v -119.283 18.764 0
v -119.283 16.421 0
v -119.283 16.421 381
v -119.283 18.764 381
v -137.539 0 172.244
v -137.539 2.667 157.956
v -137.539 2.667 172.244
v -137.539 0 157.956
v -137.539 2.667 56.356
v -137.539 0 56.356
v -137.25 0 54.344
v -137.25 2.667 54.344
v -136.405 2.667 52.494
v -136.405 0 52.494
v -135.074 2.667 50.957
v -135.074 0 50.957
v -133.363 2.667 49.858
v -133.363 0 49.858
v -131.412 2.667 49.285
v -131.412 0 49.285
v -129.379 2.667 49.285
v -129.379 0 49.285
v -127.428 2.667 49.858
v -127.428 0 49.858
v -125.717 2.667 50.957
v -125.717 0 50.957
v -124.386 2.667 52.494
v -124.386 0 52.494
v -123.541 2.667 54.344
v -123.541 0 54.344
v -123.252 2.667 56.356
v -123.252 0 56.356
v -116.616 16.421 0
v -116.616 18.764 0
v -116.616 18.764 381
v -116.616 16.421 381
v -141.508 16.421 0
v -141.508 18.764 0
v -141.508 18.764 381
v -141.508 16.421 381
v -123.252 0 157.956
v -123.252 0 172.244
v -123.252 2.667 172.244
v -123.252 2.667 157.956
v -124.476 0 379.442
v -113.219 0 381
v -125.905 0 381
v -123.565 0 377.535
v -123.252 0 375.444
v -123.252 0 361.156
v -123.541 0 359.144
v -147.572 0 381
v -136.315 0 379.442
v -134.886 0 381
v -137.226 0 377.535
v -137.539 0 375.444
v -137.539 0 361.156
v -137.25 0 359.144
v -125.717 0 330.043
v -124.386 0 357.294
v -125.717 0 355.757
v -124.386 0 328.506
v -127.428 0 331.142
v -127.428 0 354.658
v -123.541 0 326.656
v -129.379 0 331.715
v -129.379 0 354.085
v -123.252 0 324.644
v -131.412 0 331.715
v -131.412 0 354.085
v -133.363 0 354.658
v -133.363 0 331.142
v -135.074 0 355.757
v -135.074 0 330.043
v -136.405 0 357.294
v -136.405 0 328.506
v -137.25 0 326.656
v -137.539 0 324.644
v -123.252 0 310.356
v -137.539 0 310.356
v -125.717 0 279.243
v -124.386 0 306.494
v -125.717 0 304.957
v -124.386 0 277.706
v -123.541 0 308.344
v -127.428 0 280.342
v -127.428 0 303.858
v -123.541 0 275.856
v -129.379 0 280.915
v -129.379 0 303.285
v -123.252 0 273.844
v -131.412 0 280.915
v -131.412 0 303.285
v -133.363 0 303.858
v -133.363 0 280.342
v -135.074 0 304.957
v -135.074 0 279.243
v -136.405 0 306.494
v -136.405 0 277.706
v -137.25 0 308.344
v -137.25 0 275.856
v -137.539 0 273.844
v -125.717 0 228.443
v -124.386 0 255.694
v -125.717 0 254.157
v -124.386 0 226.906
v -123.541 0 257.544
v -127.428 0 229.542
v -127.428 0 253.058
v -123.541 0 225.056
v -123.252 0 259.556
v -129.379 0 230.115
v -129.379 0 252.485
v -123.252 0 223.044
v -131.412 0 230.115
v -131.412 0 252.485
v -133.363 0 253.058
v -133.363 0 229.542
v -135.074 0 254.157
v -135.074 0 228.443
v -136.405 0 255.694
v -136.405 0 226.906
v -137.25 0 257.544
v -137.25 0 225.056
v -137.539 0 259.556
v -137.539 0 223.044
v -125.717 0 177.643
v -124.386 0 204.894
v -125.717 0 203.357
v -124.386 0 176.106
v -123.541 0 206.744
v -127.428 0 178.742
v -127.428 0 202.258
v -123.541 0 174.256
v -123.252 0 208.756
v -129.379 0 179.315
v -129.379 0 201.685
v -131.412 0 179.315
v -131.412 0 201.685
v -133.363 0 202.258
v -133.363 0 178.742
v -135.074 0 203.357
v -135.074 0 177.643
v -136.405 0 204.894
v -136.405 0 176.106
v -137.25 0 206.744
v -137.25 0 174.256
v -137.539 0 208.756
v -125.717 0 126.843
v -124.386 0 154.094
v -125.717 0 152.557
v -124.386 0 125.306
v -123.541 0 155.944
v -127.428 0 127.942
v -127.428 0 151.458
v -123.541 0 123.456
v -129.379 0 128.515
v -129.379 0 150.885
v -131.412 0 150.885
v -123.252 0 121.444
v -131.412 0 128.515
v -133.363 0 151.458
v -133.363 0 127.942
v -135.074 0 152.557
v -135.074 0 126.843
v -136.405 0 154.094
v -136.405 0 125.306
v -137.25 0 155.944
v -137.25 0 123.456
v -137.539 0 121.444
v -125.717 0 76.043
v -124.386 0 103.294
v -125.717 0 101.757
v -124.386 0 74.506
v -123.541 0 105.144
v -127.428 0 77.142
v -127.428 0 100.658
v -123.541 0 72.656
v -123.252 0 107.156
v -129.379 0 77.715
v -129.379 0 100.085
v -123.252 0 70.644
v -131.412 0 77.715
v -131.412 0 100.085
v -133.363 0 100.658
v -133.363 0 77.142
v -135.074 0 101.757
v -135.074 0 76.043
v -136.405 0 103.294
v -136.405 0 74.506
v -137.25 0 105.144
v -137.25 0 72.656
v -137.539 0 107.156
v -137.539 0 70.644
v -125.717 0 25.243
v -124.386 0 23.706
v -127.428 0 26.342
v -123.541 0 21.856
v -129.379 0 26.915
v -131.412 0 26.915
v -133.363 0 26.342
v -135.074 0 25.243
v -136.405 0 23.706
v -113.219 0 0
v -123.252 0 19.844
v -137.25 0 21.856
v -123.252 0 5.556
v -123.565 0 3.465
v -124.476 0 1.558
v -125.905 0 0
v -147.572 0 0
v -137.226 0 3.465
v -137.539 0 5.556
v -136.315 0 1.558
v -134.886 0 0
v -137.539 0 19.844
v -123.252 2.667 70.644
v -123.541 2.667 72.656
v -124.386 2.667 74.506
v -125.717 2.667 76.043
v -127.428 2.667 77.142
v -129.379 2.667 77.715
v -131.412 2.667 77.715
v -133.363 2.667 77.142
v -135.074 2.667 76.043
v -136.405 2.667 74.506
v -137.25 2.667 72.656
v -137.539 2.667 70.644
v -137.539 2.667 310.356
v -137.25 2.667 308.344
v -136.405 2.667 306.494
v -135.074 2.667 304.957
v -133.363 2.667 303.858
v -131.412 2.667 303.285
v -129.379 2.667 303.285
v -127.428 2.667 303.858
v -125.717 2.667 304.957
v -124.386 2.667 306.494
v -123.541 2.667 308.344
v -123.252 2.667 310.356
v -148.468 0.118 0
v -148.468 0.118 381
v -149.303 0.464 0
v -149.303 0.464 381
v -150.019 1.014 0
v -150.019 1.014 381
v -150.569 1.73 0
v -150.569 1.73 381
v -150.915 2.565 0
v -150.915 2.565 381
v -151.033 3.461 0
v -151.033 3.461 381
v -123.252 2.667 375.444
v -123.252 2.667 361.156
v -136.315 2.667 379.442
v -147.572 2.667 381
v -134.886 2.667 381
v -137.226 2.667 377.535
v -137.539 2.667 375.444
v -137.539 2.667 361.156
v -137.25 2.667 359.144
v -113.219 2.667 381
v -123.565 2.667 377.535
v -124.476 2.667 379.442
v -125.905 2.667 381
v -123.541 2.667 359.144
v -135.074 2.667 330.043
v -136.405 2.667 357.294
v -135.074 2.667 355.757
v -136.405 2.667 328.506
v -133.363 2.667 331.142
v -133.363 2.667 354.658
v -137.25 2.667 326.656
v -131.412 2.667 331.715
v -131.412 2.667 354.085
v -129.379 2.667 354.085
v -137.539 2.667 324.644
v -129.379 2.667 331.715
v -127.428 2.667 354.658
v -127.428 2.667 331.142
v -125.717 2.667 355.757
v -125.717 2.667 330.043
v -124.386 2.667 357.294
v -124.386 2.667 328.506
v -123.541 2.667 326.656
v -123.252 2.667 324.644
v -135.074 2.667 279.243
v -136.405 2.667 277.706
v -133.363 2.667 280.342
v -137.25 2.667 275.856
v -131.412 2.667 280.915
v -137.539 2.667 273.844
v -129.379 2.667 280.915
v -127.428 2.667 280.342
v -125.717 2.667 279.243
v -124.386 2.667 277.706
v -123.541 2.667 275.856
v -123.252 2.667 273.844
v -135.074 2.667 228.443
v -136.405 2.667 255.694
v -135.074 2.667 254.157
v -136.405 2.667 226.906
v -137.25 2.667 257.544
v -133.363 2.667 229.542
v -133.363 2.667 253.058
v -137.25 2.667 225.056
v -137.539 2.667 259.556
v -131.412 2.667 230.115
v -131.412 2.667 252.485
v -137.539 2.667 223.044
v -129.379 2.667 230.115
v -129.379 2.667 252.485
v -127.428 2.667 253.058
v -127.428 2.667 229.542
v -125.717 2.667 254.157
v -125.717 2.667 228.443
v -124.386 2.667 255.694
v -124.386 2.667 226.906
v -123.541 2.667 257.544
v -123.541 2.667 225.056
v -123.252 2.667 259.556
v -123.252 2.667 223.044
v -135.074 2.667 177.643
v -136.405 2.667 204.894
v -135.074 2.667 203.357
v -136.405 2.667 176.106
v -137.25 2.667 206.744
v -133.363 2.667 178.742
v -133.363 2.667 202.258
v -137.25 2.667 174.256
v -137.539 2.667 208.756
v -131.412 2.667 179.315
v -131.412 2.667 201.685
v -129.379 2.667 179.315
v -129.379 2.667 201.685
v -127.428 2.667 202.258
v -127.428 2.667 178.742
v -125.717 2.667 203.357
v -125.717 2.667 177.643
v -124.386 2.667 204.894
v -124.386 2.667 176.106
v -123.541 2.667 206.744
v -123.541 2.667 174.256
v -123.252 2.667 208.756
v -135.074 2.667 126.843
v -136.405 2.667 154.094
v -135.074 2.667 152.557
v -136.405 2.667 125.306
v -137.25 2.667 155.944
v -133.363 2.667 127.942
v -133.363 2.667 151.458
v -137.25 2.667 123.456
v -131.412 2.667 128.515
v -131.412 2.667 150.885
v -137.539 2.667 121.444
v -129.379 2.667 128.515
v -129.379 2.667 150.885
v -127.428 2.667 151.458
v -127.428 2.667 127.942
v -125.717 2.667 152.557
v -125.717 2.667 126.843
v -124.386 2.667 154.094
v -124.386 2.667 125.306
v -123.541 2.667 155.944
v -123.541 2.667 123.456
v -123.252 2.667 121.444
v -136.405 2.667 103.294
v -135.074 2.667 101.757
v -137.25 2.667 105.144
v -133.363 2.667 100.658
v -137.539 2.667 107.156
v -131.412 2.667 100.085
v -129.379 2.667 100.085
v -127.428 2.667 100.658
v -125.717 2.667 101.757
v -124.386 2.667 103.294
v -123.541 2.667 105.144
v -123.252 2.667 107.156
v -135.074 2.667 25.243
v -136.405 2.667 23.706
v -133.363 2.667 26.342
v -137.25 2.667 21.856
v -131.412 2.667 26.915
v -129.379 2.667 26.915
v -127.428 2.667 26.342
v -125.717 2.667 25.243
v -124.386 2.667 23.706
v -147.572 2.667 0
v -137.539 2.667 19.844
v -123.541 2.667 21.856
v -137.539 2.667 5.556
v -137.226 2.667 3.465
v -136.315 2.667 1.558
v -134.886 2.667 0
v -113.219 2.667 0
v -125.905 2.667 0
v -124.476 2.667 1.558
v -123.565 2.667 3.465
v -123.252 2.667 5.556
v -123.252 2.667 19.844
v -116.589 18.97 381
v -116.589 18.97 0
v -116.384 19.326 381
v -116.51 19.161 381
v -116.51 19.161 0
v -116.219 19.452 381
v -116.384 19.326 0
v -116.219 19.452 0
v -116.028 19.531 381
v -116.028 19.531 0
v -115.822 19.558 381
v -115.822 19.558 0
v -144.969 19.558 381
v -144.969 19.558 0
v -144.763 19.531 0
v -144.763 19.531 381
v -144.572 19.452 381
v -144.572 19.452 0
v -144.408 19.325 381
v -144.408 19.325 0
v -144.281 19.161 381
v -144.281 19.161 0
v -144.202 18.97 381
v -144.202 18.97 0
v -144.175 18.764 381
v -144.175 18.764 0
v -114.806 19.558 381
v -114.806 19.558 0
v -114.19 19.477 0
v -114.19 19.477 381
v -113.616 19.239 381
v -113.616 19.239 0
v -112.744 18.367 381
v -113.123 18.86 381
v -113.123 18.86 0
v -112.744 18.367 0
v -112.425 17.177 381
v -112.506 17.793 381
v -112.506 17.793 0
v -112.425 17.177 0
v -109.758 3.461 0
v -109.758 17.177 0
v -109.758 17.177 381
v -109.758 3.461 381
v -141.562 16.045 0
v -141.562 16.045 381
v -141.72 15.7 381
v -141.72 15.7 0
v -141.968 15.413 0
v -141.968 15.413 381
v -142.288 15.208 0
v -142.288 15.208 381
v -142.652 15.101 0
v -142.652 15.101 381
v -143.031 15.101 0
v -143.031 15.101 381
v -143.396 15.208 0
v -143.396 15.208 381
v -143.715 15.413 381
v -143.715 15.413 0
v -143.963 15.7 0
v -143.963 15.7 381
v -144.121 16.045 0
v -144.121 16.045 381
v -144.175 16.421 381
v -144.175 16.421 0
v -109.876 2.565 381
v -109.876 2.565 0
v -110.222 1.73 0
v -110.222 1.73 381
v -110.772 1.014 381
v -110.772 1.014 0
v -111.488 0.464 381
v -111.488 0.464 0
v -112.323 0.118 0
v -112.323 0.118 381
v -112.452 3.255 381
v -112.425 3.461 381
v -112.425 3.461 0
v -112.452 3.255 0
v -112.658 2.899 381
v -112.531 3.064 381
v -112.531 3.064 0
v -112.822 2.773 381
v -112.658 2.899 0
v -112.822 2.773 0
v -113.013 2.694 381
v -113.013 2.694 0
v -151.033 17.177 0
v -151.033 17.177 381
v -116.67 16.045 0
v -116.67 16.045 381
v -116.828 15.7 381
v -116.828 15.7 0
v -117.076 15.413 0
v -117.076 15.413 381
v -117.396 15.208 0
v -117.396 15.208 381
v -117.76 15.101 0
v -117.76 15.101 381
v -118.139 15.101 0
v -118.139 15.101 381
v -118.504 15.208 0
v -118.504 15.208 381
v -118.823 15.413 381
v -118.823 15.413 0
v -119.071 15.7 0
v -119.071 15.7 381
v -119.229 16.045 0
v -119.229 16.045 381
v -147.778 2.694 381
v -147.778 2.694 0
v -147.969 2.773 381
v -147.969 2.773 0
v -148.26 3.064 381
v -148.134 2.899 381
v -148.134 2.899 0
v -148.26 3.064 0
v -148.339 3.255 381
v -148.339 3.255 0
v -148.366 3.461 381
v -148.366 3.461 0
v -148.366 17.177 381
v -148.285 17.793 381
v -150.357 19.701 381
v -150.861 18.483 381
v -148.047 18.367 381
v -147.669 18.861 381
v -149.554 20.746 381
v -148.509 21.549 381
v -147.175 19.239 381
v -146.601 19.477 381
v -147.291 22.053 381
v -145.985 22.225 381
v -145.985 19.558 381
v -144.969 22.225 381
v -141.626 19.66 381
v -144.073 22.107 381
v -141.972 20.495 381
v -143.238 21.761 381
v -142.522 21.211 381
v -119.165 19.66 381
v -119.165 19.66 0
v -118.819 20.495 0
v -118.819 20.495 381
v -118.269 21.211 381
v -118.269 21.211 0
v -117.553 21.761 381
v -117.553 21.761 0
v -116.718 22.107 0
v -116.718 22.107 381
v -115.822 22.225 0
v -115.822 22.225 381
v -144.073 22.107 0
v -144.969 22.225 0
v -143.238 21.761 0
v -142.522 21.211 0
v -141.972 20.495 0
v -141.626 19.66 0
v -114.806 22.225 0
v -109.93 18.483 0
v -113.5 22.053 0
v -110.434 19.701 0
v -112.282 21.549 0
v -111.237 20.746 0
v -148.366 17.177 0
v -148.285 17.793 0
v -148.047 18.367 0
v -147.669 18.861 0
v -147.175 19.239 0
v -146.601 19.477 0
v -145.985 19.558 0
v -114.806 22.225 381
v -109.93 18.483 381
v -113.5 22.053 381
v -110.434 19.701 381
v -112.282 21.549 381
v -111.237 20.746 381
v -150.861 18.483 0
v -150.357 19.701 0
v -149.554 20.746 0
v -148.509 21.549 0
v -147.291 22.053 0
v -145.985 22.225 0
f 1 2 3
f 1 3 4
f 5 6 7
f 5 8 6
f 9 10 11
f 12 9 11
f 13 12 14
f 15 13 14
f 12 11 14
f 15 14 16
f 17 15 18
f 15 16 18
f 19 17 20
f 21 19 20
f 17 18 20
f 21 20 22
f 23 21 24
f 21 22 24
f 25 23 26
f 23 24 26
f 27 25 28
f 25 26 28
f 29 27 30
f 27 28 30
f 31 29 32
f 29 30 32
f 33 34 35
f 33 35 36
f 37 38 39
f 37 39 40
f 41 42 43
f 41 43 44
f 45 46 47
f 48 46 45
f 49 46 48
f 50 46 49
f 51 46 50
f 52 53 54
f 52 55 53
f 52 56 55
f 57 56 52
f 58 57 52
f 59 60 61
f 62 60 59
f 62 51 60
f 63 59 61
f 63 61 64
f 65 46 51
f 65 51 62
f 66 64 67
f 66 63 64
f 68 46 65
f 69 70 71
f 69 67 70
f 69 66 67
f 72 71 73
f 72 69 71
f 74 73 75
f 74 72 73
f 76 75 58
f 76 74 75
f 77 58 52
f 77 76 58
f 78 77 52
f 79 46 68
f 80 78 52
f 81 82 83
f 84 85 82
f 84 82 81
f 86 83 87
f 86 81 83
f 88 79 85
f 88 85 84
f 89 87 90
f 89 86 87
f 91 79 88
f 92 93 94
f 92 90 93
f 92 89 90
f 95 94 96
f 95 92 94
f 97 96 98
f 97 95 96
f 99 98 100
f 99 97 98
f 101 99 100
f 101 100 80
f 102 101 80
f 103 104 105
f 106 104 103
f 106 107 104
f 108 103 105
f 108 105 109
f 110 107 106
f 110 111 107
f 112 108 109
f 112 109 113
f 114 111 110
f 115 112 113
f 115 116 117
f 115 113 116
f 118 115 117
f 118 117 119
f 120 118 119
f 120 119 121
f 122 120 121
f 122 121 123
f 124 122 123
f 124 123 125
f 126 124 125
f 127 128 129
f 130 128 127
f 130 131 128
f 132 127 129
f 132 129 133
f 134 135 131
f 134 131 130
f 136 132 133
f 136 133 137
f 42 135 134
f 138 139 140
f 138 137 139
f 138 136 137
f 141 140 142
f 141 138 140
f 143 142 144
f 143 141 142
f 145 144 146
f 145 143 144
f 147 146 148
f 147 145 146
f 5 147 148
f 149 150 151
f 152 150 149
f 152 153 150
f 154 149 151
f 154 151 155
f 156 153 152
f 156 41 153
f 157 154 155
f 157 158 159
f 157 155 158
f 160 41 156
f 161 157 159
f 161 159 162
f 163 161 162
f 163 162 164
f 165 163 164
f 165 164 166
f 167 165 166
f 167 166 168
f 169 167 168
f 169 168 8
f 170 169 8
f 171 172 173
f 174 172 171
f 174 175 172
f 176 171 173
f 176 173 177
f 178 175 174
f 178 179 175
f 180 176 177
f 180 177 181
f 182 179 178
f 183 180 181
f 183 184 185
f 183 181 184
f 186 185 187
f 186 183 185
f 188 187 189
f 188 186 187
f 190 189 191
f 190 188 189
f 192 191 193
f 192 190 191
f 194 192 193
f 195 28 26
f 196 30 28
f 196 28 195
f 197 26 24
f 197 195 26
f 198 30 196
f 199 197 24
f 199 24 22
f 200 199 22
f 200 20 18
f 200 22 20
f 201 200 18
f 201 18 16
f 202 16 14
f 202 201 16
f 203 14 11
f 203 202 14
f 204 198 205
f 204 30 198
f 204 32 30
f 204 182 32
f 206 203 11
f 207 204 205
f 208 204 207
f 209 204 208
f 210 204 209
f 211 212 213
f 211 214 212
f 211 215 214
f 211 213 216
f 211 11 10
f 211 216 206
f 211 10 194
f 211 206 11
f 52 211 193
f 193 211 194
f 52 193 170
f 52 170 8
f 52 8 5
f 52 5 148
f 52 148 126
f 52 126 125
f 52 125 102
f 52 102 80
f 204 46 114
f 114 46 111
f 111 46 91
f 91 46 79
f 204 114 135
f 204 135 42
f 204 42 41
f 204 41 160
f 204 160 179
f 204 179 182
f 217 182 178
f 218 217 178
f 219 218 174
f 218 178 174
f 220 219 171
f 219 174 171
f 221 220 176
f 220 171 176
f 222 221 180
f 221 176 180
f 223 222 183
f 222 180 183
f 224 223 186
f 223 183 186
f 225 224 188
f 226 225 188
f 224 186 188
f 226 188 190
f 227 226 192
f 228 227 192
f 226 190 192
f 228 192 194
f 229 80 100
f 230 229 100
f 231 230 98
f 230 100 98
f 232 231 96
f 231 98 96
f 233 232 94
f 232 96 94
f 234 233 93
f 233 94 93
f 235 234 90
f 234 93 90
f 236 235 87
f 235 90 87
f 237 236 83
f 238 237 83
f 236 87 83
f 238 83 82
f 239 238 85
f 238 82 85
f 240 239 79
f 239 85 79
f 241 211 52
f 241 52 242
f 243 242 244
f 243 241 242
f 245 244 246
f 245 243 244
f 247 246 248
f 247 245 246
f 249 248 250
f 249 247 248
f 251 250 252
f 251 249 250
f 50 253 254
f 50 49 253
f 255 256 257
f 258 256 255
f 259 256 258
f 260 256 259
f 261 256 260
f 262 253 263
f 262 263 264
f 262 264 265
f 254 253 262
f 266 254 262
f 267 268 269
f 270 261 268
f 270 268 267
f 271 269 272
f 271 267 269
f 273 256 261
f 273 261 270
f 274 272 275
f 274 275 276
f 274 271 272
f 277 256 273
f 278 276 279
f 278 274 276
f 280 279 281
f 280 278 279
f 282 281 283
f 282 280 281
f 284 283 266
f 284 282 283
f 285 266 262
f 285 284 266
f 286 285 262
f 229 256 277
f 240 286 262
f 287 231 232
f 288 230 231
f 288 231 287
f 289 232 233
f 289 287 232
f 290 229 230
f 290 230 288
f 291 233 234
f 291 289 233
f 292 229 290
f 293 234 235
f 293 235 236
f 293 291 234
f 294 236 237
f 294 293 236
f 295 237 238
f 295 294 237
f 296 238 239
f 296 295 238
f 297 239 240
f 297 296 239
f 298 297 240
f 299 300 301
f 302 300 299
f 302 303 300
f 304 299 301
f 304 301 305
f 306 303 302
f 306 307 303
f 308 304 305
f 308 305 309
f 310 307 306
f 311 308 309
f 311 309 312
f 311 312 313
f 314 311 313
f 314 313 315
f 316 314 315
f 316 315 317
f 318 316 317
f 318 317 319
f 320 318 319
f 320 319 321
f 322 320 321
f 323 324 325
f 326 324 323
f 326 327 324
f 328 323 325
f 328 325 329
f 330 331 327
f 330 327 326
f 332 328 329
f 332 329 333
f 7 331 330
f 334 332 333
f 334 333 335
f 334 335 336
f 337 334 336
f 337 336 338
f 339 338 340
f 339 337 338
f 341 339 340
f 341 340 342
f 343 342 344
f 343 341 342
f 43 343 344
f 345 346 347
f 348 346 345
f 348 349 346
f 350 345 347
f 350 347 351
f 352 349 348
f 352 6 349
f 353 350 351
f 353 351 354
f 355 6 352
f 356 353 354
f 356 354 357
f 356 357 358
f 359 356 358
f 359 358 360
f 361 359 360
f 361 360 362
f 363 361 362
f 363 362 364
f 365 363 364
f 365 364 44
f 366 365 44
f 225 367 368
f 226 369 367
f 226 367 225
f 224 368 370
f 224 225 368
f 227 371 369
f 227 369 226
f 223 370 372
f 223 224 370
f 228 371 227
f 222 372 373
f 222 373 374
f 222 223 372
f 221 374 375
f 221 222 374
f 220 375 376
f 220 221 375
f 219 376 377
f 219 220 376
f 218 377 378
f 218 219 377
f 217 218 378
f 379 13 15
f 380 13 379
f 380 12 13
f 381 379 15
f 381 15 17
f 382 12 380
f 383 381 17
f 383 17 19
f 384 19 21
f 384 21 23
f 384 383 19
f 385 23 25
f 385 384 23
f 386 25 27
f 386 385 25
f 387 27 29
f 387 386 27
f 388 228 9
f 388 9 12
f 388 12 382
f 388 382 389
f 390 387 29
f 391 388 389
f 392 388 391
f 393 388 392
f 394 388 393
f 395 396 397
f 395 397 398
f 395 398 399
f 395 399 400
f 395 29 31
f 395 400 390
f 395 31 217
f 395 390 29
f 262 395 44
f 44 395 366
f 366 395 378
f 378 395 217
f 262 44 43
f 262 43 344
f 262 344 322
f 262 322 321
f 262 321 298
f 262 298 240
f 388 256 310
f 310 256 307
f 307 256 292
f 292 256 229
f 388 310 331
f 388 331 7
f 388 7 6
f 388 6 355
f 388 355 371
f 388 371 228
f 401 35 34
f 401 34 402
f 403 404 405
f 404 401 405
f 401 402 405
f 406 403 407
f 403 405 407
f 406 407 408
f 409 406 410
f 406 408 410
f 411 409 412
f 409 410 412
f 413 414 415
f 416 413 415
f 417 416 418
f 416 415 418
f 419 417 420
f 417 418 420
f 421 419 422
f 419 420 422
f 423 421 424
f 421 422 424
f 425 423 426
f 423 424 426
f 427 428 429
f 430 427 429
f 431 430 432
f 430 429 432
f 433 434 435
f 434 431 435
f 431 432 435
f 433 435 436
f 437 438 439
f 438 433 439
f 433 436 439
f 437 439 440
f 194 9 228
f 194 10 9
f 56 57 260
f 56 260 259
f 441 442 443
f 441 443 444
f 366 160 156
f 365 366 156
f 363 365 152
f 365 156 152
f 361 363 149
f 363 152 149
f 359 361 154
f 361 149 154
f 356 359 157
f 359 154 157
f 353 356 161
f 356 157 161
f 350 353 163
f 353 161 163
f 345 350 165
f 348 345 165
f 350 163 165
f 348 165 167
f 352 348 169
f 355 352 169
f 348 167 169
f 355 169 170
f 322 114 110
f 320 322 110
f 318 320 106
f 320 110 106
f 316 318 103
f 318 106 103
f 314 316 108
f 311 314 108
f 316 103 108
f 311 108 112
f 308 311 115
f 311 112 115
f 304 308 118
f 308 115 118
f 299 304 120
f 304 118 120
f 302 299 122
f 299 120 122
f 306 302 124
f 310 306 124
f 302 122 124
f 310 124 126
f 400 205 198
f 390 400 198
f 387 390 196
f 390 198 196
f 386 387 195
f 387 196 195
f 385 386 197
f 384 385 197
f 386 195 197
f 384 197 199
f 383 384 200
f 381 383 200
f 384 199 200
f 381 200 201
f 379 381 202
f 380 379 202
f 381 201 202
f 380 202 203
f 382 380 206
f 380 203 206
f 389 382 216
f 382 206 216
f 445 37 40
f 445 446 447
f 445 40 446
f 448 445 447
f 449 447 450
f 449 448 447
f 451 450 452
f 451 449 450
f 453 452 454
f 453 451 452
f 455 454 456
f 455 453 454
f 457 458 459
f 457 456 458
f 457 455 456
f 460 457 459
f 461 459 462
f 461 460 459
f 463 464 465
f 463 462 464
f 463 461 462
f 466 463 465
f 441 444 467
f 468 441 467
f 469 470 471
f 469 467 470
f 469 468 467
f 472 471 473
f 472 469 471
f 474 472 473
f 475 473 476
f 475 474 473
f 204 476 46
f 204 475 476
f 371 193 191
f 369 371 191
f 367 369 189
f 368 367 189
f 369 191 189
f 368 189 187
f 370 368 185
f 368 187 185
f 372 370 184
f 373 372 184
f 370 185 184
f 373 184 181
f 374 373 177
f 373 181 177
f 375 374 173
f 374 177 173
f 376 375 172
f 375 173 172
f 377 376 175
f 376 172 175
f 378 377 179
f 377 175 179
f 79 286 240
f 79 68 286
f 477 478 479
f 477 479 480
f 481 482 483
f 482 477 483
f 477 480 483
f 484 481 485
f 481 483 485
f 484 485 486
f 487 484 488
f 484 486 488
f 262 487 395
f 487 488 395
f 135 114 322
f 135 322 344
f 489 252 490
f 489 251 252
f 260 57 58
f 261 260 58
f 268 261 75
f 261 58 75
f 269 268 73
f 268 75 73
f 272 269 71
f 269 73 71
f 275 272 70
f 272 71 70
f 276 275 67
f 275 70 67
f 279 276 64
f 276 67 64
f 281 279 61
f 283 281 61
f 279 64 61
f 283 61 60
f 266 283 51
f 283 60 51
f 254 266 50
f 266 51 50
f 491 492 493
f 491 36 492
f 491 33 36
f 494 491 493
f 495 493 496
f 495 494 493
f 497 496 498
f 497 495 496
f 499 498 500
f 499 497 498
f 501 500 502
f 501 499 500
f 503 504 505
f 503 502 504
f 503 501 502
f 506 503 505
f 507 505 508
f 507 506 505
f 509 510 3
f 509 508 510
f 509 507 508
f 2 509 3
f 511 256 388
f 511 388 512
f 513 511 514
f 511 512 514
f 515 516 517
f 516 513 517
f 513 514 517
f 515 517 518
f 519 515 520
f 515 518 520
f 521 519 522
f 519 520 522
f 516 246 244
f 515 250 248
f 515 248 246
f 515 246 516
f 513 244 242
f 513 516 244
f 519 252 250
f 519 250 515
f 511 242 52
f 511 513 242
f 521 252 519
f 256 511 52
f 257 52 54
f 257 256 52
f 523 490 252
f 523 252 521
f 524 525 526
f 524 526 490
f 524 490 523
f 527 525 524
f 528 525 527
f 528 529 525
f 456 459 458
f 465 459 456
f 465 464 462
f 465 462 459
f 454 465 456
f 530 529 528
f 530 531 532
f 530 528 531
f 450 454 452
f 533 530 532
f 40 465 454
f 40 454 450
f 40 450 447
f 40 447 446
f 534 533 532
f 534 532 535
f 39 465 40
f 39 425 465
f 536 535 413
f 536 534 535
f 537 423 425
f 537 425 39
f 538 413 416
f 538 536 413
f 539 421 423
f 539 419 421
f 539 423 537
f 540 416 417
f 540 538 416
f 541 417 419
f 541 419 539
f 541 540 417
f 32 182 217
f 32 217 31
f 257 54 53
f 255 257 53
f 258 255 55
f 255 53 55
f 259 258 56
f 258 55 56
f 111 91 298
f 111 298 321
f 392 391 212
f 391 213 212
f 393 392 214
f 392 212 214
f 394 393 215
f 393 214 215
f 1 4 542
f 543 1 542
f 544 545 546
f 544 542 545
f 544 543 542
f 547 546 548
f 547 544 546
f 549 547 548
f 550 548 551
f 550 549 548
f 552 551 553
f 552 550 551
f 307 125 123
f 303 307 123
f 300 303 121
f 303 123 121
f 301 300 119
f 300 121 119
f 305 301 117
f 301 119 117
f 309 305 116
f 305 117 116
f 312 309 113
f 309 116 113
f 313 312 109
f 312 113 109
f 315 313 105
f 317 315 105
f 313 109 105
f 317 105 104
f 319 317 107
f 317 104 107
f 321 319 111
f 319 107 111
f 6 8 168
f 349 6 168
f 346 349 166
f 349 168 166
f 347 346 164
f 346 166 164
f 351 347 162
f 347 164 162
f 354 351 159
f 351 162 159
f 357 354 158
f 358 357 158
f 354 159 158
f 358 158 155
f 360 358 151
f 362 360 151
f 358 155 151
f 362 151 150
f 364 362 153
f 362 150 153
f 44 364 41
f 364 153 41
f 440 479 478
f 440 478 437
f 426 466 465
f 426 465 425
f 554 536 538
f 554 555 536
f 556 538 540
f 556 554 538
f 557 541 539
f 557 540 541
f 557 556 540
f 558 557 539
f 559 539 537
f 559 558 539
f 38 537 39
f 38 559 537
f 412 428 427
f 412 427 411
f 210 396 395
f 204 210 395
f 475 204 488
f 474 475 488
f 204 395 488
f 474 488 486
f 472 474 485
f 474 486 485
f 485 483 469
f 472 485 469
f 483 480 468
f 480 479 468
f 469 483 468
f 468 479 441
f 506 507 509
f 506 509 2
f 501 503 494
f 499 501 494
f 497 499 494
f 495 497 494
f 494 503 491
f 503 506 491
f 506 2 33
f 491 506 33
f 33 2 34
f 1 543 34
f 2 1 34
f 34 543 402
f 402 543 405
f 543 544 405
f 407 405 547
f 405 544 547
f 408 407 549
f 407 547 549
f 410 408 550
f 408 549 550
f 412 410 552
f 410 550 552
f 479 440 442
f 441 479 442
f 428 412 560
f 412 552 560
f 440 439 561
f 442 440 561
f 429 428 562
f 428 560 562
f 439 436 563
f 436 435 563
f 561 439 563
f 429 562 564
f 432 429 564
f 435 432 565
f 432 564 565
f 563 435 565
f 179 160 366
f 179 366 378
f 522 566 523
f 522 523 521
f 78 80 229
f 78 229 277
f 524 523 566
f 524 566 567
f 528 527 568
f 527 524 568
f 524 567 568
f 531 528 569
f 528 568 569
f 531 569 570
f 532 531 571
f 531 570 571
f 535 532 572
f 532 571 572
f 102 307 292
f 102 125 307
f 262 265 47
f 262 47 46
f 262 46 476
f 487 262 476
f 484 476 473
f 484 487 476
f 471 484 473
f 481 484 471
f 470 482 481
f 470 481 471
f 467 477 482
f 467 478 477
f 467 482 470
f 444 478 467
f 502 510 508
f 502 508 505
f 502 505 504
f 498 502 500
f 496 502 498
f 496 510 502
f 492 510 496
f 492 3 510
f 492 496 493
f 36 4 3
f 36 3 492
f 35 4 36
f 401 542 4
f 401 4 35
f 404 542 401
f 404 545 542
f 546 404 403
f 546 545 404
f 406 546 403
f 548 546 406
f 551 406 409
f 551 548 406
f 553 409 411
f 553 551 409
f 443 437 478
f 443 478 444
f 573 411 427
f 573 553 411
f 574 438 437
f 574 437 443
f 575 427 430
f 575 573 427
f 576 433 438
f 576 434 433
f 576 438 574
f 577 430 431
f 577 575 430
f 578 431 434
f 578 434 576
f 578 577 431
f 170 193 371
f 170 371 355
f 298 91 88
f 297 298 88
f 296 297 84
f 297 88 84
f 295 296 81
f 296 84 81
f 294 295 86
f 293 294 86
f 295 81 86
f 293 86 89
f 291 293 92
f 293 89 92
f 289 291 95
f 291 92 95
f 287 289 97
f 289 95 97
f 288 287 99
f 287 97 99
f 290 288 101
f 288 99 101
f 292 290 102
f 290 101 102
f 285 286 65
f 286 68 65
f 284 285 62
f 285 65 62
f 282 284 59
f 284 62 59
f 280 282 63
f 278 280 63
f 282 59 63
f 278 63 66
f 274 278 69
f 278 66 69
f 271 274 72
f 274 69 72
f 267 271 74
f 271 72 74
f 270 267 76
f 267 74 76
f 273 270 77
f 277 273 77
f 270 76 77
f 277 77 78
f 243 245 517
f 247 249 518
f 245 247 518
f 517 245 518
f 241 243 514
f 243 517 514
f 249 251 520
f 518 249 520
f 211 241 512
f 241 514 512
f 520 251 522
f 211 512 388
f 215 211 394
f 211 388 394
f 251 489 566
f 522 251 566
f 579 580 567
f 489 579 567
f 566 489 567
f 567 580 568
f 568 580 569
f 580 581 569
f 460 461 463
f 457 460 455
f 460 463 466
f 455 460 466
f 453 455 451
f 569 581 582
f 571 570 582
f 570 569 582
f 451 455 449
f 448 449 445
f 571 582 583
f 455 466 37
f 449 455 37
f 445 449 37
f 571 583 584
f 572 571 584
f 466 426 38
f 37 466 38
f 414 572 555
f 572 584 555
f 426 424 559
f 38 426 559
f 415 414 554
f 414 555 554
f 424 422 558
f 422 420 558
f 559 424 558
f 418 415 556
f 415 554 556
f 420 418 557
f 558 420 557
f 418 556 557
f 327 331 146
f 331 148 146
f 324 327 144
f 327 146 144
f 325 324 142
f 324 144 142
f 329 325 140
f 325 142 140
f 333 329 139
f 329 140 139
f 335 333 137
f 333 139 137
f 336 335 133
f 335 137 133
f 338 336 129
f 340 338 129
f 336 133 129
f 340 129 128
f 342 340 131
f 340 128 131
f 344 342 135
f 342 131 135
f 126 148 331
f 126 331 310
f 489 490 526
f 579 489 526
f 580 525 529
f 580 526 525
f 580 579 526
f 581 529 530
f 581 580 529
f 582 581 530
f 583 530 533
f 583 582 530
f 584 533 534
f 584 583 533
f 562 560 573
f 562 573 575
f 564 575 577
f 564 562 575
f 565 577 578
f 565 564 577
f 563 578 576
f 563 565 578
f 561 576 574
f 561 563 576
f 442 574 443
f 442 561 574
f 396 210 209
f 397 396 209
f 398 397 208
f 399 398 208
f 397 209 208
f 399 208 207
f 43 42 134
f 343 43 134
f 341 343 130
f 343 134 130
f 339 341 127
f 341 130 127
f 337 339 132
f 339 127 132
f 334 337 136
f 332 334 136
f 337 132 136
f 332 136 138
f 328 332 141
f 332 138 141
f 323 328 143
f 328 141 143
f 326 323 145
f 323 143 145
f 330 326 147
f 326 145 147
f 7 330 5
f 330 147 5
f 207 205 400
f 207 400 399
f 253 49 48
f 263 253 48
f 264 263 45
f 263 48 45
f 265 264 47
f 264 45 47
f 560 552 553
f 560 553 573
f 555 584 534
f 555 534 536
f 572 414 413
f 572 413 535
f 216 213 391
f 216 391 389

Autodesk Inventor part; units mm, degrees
ref_plane "YZ Plane" through (0, 0, 0) normal (1, 0, 0) x (0, 1, 0)
ref_plane "XZ Plane" through (0, 0, 0) normal (0, 1, 0) x (-1, 0, 0)
ref_plane "Work Plane1" through (0, 0, 0) normal (0, 0, 1) x (1, 0, 0)
sketch "Sketch1" plane through (0, 0, 0) normal (0, 0, 1) x (1, 0, 0)
  arc A0 (-113.2188, 0) -> (-109.7581, 3.4607) centre (-113.2188, 3.4607) ccw projected
  line L0 (-109.7581, 17.1767) -> (-109.7581, 3.4607) projected
  arc A1 (-109.7581, 17.1767) -> (-114.8063, 22.225) centre (-114.8063, 17.1767) ccw projected
  line L1 (-115.8223, 22.225) -> (-114.8063, 22.225) projected
  arc A2 (-115.8223, 22.225) -> (-119.2831, 18.7642) centre (-115.8223, 18.7642) ccw projected
  line L2 (-119.2831, 16.4211) -> (-119.2831, 18.7642) projected
  arc A3 (-119.2831, 16.4211) -> (-116.6161, 16.4211) centre (-117.9496, 16.4211) ccw projected
  line L3 (-116.6161, 18.7642) -> (-116.6161, 16.4211) projected
  arc A4 (-115.8223, 19.558) -> (-116.6161, 18.7642) centre (-115.8223, 18.7642) ccw projected
  line L4 (-114.8063, 19.558) -> (-115.8223, 19.558) projected
  arc A5 (-112.4251, 17.1767) -> (-114.8063, 19.558) centre (-114.8063, 17.1767) ccw projected
  line L5 (-112.4251, 3.4607) -> (-112.4251, 17.1767) projected
  arc A6 (-113.2188, 2.667) -> (-112.4251, 3.4607) centre (-113.2188, 3.4607) ccw projected
  line L6 (-147.5723, 2.667) -> (-113.2188, 2.667) projected
  arc A7 (-148.3661, 3.4607) -> (-147.5723, 2.667) centre (-147.5723, 3.4607) ccw projected
  line L7 (-148.3661, 17.1767) -> (-148.3661, 3.4607) projected
  arc A8 (-145.9848, 19.558) -> (-148.3661, 17.1767) centre (-145.9848, 17.1767) ccw projected
  line L8 (-144.9688, 19.558) -> (-145.9848, 19.558) projected
  arc A9 (-144.1751, 18.7642) -> (-144.9688, 19.558) centre (-144.9688, 18.7642) ccw projected
  line L9 (-144.1751, 16.4211) -> (-144.1751, 18.7642) projected
  arc A10 (-144.1751, 16.4211) -> (-141.5081, 16.4211) centre (-142.8416, 16.4211) ccw projected
  line L10 (-141.5081, 18.7642) -> (-141.5081, 16.4211) projected
  arc A11 (-141.5081, 18.7642) -> (-144.9688, 22.225) centre (-144.9688, 18.7642) ccw projected
  line L11 (-145.9848, 22.225) -> (-144.9688, 22.225) projected
  arc A12 (-145.9848, 22.225) -> (-151.0331, 17.1767) centre (-145.9848, 17.1767) ccw projected
  line L12 (-151.0331, 3.4607) -> (-151.0331, 17.1767) projected
  arc A13 (-151.0331, 3.4607) -> (-147.5723, 0) centre (-147.5723, 3.4607) ccw projected
  line L13 (-113.2188, 0) -> (-147.5723, 0) projected
  point P0 (0, 0)
extrude "Extrusion1" add sketch "Sketch1" along normal blind 381
ref_plane "Work Plane2" through (0, 0, 190.5) normal (0, 0, 1) x (1, 0, 0)
sketch "Sketch2" plane through (-147.5723, 0, 0) normal (0, -1, 0) x (1, 0, 0)
  line L0 (34.3535, 0) -> (0, 0) construction
  line L1 (17.1767, 0) -> (17.1767, 381) construction
  line L2 (0, 381) -> (34.3535, 381) construction
  line L3 (17.1767, 382.5875) -> (17.1767, 354.0125) construction
  line L4 (24.3205, 375.4438) -> (24.3205, 361.1562)
  line L5 (10.033, 361.1562) -> (10.033, 375.4438)
  arc A0 (24.3205, 375.4438) -> (10.033, 375.4438) centre (17.1767, 375.4438) ccw
  arc A1 (10.033, 361.1562) -> (24.3205, 361.1562) centre (17.1767, 361.1562) ccw
  point P0 (147.5723, 0)
  point P1 (17.1767, 368.3)
  dimension "d6" = 14.2875
  dimension "d7" = 28.575
  dimension "d15" = 1.5875
extrude "Extrusion2" cut sketch "Sketch2" against normal blind 25.4
pattern_linear "Rectangular Pattern1" count 8 spacing 50.8 along (0, 0, -1) of "Extrusion2"
properties part number "Horizontal-Unistrut-Tower-Connector-15 w holes"
